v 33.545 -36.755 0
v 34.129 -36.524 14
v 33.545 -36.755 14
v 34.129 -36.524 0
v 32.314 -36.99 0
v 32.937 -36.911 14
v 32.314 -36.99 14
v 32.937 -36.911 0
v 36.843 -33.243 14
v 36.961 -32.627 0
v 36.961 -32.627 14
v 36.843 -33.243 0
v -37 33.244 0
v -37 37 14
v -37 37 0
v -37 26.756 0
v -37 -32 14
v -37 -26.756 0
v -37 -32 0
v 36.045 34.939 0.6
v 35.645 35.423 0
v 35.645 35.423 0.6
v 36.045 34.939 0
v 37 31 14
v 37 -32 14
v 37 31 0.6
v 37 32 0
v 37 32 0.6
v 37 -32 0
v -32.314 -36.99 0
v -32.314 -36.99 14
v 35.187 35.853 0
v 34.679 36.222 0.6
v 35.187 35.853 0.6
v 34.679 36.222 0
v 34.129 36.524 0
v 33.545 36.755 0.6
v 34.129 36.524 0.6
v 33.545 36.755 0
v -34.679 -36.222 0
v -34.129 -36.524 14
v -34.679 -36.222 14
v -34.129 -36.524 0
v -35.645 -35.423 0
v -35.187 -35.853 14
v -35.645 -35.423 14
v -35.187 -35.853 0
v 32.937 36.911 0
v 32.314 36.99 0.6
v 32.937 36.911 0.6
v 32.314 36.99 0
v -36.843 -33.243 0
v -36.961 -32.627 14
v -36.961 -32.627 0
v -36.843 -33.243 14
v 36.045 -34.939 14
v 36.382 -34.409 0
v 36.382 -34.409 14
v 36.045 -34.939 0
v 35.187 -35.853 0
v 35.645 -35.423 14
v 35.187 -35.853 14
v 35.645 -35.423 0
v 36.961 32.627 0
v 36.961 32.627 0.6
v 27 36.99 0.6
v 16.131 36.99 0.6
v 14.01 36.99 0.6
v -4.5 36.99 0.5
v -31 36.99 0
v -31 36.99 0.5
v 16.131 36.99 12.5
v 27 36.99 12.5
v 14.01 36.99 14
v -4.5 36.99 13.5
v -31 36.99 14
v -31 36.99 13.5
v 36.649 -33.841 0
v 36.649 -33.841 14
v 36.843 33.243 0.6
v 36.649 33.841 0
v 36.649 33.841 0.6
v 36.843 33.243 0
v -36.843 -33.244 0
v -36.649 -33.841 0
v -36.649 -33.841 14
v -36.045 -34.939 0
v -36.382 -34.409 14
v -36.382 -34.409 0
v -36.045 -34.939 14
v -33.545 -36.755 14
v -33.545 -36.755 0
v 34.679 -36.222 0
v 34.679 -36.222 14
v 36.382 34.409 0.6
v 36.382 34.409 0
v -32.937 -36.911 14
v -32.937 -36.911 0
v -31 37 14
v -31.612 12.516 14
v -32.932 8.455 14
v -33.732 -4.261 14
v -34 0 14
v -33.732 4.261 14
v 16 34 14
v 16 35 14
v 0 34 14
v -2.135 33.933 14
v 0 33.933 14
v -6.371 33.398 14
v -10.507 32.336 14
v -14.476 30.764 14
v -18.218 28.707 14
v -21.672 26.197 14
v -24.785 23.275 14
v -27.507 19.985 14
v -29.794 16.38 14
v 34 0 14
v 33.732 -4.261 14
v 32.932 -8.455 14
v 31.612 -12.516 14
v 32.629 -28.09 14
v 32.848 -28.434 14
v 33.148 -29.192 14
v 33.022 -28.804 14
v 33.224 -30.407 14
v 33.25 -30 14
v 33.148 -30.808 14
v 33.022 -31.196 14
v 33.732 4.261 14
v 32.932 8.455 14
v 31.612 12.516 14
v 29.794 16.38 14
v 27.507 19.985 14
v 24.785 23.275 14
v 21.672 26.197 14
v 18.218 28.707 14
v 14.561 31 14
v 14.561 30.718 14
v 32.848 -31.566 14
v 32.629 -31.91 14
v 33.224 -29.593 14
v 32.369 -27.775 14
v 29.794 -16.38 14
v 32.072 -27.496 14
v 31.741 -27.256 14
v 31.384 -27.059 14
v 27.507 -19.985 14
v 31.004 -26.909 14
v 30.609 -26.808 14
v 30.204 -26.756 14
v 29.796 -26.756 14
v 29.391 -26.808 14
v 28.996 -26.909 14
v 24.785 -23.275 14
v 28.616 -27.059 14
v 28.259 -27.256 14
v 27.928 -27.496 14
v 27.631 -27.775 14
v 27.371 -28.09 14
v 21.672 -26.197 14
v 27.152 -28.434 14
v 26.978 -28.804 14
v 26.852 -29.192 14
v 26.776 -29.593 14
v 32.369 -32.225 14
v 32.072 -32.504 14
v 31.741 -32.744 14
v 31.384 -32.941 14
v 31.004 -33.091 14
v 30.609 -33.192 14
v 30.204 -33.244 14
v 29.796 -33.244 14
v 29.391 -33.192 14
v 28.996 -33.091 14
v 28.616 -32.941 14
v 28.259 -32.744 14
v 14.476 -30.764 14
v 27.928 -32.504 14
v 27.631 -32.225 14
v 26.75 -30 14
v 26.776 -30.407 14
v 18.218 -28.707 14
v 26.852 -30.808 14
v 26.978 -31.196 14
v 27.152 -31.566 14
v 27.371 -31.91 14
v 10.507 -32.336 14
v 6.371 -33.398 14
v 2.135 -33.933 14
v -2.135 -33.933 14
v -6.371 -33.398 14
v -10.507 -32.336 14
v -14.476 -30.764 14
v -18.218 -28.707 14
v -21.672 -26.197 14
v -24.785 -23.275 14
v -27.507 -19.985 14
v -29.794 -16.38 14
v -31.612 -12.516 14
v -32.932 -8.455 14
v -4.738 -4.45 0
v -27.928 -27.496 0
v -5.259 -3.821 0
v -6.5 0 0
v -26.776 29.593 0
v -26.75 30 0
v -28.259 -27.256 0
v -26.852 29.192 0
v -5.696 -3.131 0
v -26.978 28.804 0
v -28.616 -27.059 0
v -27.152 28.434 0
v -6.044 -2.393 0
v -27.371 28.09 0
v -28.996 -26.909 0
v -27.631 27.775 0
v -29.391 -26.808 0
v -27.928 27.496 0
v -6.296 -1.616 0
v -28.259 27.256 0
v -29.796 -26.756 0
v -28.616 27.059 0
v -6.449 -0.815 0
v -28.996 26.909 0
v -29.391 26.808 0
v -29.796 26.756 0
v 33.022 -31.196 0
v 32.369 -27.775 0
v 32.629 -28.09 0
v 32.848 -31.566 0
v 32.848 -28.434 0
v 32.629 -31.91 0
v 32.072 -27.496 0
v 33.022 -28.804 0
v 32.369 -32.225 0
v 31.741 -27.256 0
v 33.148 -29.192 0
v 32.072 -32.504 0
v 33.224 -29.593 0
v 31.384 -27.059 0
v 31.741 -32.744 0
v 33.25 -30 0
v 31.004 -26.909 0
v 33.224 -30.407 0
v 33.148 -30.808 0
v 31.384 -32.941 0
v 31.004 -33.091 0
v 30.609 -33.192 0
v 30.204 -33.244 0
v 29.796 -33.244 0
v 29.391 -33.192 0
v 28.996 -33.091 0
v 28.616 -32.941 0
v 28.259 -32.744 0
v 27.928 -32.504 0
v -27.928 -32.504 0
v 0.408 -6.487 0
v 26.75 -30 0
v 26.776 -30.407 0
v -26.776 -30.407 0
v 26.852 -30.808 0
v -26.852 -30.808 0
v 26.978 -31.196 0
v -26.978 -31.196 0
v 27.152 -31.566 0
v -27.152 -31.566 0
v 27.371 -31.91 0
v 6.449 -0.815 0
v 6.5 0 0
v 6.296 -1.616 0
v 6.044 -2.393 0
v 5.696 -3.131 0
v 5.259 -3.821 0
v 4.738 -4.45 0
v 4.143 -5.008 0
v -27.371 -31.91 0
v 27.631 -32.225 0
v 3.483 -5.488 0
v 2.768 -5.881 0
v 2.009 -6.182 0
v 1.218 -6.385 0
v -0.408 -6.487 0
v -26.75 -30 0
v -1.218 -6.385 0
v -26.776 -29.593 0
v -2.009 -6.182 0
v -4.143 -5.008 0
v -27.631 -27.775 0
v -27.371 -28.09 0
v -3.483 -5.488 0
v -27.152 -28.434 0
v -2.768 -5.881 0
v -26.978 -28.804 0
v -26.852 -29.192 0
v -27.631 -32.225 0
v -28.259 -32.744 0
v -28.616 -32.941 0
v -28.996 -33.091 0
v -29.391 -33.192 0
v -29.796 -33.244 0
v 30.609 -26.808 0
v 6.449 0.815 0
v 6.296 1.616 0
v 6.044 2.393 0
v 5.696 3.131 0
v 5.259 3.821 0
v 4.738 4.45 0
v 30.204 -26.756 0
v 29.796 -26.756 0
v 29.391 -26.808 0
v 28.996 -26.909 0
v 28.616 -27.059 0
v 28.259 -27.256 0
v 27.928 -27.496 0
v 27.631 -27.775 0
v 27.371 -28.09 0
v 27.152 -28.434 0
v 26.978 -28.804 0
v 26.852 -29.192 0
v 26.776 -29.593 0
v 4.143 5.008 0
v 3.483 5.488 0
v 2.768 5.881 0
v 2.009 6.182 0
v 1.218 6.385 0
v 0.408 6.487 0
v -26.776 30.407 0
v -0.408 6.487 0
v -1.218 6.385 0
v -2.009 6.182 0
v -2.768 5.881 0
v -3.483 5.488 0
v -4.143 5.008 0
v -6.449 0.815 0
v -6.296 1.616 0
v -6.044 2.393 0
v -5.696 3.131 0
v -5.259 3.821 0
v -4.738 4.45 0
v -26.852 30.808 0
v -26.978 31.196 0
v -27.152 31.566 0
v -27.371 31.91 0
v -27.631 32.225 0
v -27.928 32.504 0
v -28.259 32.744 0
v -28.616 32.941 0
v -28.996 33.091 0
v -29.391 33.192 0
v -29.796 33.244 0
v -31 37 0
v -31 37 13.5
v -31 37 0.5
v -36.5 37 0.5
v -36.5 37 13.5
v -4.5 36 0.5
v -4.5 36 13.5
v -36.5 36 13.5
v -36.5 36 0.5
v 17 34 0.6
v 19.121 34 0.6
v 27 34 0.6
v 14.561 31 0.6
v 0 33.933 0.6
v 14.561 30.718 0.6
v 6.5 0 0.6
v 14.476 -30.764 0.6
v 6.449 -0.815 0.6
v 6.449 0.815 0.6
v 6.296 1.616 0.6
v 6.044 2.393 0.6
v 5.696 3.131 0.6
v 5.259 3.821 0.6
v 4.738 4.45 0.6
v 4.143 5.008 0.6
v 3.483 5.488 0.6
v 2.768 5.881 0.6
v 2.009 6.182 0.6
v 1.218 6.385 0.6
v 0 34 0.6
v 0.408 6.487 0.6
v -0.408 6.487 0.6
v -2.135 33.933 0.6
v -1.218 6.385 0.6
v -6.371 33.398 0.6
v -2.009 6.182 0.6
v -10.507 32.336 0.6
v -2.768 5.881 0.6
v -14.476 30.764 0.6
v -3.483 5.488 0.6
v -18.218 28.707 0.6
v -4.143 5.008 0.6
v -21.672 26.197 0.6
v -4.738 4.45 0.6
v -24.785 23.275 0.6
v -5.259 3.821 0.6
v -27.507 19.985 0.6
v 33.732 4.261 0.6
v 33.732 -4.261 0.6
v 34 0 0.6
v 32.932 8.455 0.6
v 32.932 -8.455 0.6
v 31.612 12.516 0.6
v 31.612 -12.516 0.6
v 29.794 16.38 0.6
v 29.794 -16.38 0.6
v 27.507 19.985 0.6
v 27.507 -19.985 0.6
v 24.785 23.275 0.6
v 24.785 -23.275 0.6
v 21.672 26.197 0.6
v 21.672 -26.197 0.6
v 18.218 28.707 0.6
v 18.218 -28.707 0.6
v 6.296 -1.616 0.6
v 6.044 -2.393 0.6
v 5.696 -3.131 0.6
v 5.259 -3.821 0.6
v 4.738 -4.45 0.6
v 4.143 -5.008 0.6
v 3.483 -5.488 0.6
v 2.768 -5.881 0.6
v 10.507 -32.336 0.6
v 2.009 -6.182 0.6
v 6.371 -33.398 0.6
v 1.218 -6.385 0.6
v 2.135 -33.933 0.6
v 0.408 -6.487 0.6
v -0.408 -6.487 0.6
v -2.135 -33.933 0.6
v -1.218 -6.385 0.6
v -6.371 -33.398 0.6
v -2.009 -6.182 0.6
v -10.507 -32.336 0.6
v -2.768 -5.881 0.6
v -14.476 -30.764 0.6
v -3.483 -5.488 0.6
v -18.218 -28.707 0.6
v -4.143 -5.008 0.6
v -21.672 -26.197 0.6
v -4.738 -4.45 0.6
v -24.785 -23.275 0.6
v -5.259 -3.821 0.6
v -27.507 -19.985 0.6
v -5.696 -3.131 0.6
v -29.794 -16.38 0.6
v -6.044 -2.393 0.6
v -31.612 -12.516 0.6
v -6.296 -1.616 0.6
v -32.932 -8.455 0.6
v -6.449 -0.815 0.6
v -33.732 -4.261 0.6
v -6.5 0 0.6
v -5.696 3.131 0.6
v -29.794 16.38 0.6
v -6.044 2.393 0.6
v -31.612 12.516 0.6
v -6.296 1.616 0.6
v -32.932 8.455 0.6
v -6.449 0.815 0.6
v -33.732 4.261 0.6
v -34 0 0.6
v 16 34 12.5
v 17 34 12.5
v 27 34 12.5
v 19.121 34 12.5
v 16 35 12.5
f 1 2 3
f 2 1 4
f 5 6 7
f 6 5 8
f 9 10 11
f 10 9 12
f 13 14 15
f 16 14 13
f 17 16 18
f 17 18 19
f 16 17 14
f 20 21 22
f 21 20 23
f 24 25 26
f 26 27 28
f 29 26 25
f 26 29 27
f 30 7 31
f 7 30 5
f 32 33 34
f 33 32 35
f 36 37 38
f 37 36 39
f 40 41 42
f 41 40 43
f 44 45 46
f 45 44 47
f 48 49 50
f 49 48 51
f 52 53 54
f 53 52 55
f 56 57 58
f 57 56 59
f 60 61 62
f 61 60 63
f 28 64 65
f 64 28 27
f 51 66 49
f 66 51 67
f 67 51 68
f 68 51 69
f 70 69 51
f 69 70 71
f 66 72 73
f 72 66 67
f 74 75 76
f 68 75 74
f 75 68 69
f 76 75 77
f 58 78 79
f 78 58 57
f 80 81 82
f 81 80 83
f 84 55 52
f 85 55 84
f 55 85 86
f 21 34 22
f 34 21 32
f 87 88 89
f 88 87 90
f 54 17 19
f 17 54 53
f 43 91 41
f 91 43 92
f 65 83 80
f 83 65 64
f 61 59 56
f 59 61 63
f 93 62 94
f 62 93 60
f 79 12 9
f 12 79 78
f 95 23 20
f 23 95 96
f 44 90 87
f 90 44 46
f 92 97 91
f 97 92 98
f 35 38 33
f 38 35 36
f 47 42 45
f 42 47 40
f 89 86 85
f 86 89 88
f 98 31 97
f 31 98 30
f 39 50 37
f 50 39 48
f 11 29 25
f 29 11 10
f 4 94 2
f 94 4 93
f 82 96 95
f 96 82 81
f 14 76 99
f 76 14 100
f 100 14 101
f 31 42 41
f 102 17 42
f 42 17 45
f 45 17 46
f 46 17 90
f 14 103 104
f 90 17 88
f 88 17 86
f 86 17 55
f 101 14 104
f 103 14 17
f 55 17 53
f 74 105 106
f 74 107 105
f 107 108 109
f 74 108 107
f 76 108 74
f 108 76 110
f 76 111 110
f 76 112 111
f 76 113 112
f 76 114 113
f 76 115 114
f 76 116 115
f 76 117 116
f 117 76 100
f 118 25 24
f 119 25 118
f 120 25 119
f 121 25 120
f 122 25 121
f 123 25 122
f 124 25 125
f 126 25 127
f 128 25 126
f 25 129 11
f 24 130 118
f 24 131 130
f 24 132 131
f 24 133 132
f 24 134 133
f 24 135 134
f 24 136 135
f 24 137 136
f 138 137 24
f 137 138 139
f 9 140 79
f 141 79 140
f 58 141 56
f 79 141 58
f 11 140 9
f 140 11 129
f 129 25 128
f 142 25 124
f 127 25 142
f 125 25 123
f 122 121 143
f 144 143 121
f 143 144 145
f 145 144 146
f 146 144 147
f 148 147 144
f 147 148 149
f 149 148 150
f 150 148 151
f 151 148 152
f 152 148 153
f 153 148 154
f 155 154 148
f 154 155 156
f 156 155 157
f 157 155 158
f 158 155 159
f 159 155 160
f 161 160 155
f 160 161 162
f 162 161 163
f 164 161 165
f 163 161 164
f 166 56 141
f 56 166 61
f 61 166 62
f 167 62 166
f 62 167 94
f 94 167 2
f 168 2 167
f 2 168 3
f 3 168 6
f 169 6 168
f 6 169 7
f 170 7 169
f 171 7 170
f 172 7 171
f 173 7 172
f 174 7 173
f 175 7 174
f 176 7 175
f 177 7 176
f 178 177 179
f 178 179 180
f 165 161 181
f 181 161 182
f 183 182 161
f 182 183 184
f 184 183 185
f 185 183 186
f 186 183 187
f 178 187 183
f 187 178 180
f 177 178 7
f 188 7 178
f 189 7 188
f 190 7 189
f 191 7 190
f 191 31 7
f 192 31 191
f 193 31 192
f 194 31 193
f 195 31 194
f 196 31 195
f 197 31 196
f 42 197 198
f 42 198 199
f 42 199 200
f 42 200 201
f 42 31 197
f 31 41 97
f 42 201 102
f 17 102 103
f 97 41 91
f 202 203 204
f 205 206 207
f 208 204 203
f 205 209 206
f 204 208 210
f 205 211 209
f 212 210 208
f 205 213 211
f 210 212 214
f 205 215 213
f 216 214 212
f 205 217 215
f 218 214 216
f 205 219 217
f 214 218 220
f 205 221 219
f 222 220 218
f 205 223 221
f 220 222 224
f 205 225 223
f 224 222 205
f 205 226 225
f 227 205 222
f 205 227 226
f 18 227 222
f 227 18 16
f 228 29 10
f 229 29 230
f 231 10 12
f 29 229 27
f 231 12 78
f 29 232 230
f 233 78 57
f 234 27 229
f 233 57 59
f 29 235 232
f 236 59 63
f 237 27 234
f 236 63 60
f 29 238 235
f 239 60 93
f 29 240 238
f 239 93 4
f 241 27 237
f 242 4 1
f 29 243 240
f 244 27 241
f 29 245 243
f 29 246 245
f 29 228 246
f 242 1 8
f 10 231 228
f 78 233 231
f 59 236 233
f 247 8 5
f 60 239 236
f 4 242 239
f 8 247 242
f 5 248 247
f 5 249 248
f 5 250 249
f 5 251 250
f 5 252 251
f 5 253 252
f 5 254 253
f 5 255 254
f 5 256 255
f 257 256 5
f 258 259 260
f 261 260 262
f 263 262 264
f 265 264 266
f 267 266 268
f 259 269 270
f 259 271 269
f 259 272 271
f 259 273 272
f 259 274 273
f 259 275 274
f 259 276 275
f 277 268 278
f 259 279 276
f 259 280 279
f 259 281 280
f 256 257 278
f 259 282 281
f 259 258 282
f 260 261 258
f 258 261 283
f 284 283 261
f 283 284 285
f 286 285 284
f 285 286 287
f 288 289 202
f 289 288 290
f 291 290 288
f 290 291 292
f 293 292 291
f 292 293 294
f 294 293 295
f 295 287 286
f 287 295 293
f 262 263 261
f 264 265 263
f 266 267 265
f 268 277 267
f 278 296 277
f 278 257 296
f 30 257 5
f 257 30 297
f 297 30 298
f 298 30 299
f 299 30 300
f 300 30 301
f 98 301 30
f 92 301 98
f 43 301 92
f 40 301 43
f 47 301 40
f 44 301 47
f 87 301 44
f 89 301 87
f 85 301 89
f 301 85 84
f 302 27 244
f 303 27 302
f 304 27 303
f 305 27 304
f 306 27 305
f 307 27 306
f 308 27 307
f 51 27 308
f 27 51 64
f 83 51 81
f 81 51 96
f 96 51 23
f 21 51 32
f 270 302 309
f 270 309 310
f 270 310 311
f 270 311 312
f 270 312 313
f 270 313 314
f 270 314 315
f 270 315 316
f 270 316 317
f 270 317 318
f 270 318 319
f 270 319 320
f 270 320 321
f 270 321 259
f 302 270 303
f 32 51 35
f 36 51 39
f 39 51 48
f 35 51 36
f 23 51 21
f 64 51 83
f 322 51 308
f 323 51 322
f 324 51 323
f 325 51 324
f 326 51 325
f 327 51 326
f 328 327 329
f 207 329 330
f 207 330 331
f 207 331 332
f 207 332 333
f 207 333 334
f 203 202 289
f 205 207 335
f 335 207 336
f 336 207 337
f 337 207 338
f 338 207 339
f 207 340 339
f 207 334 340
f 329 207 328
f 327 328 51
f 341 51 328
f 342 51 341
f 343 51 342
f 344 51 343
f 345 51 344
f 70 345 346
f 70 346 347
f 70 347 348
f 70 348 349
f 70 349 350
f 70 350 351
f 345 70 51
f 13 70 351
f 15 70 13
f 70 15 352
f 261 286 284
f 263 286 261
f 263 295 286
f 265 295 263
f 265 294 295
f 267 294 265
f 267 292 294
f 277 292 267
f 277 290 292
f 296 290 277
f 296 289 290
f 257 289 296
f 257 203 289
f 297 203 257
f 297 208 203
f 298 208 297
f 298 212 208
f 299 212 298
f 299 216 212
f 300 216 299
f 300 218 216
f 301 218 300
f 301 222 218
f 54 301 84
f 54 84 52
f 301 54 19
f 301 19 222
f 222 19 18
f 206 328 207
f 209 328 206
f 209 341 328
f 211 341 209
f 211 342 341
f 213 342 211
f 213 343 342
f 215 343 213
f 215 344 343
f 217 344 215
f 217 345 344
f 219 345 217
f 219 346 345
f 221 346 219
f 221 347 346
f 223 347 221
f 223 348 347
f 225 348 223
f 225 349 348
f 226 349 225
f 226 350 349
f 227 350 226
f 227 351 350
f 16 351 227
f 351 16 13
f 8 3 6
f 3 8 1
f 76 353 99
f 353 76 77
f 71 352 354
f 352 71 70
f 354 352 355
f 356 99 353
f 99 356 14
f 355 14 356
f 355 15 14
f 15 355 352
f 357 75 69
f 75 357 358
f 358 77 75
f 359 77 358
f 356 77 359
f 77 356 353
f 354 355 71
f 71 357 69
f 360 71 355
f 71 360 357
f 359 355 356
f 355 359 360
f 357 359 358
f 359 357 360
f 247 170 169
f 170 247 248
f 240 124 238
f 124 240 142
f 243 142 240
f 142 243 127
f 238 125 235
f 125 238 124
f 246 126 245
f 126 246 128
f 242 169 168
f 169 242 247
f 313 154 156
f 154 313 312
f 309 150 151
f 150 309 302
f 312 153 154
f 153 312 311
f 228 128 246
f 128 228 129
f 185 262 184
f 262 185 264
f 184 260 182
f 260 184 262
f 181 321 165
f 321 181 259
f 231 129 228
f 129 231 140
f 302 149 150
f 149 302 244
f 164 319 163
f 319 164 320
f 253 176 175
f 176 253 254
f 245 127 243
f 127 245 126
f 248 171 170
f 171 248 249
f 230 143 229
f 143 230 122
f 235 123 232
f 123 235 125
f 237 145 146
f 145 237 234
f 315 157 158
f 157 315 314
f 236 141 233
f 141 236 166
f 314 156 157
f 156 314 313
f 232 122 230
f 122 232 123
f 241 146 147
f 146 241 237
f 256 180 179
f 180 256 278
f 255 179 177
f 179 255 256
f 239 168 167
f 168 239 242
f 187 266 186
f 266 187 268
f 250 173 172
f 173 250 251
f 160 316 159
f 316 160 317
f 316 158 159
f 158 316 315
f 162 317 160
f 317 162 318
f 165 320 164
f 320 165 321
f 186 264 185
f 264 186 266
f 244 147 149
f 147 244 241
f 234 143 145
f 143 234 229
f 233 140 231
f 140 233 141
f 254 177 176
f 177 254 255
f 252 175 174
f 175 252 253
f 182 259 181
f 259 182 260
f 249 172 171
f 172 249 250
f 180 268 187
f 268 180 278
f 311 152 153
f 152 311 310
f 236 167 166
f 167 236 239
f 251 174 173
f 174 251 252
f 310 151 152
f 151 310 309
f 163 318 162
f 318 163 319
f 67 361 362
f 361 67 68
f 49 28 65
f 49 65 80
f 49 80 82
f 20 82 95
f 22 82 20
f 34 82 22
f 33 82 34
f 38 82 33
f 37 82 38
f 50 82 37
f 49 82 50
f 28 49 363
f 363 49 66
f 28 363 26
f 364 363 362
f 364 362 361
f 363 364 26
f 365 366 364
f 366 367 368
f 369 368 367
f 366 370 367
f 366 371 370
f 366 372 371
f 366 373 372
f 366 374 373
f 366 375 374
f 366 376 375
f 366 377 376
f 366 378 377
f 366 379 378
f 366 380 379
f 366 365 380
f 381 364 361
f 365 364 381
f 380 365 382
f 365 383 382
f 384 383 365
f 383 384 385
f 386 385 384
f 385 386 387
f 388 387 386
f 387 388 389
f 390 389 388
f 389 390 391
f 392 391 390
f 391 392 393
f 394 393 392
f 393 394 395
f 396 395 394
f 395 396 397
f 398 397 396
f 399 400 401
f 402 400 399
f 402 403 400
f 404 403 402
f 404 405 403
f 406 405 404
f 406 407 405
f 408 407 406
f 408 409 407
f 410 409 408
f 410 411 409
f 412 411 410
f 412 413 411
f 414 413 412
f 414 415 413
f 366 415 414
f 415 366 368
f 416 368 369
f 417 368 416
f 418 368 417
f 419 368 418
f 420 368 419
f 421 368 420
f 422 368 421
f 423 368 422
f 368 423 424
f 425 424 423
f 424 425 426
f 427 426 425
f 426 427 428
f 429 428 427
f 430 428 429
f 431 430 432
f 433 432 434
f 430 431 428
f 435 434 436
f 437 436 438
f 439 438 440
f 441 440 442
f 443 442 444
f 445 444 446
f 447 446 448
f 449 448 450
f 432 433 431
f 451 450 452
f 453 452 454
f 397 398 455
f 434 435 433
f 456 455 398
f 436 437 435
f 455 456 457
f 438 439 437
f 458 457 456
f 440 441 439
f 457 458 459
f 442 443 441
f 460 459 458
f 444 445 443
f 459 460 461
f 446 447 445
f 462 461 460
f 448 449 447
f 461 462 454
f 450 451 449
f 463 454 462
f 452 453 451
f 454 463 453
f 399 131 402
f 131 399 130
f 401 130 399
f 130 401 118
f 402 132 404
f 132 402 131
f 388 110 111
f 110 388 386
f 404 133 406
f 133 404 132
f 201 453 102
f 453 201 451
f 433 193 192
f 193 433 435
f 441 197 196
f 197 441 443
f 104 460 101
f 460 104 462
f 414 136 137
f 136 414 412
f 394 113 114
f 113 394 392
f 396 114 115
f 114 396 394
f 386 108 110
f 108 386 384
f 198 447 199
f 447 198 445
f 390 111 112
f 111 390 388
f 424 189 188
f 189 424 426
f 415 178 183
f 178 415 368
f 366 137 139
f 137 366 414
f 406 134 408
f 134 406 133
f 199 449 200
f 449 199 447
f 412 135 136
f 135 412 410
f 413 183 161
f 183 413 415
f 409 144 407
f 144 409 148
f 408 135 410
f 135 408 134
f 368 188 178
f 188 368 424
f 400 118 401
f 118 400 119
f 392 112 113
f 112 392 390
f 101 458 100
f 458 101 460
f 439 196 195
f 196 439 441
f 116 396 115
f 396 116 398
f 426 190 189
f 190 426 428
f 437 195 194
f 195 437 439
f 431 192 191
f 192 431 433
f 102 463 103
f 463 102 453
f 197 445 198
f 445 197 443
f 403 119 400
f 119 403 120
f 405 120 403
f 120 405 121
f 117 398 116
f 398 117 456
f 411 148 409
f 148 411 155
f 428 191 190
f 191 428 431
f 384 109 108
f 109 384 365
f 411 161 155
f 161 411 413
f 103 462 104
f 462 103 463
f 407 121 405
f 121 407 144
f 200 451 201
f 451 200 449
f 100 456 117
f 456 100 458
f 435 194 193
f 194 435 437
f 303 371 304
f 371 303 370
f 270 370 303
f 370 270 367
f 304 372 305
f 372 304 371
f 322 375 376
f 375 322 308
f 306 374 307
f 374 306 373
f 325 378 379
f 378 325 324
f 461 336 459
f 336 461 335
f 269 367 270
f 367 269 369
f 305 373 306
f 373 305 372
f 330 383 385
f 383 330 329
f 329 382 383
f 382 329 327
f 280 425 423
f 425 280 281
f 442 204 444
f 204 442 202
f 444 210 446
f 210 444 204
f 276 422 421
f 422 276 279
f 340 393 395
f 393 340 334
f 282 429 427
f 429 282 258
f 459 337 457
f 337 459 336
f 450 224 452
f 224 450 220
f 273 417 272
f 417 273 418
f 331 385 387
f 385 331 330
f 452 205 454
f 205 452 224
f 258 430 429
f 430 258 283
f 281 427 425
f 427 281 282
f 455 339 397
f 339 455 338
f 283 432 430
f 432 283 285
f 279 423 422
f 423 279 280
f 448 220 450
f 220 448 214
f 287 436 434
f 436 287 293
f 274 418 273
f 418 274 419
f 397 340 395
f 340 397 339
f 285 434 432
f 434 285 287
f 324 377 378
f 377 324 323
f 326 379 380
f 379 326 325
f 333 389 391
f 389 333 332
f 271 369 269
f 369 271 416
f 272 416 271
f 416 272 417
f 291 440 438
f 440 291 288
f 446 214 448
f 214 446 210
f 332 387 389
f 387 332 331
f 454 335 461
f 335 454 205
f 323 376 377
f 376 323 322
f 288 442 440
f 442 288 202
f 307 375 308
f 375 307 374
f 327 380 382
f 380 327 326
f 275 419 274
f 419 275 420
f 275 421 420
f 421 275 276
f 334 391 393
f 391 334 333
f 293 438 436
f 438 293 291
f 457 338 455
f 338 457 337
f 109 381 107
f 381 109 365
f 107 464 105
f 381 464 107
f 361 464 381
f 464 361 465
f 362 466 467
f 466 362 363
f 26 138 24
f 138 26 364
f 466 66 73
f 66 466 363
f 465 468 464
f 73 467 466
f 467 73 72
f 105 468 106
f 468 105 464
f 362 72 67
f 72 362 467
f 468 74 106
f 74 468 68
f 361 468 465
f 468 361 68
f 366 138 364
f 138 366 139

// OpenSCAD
$fn = 50;


difference() {
	union() {
		hull() {
			translate(v = [-32.0000000000, 32.0000000000, 0]) {
				cylinder(h = 14, r = 5);
			}
			translate(v = [32.0000000000, 32.0000000000, 0]) {
				cylinder(h = 14, r = 5);
			}
			translate(v = [-32.0000000000, -32.0000000000, 0]) {
				cylinder(h = 14, r = 5);
			}
			translate(v = [32.0000000000, -32.0000000000, 0]) {
				cylinder(h = 14, r = 5);
			}
		}
		translate(v = [-37.0000000000, 31.0000000000, 0]) {
			cube(size = [6, 6, 14]);
		}
	}
	union() {
		translate(v = [-37.5000000000, -30.0000000000, -250.0000000000]) {
			rotate(a = [0, 0, 0]) {
				difference() {
					union() {
						hull() {
							translate(v = [7.5000000000, 0, 0]) {
								cylinder(h = 250, r = 3.2500000000, r1 = 3.2500000000, r2 = 3.2500000000);
							}
							translate(v = [-7.5000000000, 0, 0]) {
								cylinder(h = 250, r = 3.2500000000, r1 = 3.2500000000, r2 = 3.2500000000);
							}
						}
					}
					union();
				}
			}
		}
		translate(v = [-37.5000000000, 30.0000000000, -250.0000000000]) {
			rotate(a = [0, 0, 0]) {
				difference() {
					union() {
						hull() {
							translate(v = [7.5000000000, 0, 0]) {
								cylinder(h = 250, r = 3.2500000000, r1 = 3.2500000000, r2 = 3.2500000000);
							}
							translate(v = [-7.5000000000, 0, 0]) {
								cylinder(h = 250, r = 3.2500000000, r1 = 3.2500000000, r2 = 3.2500000000);
							}
						}
					}
					union();
				}
			}
		}
		translate(v = [-36.5000000000, 36.0000000000, 0.5000000000]) {
			cube(size = [32, 1, 13.0000000000]);
		}
		translate(v = [30.0000000000, -30.0000000000, -50.0000000000]) {
			cylinder(h = 100, r = 3.2500000000);
		}
		translate(v = [0, 0, 0.6000000000]) {
			cylinder(h = 16.4000000000, r = 34.0000000000);
		}
		translate(v = [0, 0, -7.0000000000]) {
			cylinder(h = 14, r = 6.5000000000);
		}
		translate(v = [0.0000000000, 31.0000000000, 0.6000000000]) {
			cube(size = [37.0000000000, 3, 16.4000000000]);
		}
		translate(v = [27.0000000000, 31.0000000000, 0.6000000000]) {
			cube(size = [10, 6, 16.4000000000]);
		}
		translate(v = [16.0000000000, 31.0000000000, 12.5000000000]) {
			cube(size = [21, 6, 1.5000000000]);
		}
		translate(v = [13.2500000000, 37.7500000000, 0.6000000000]) {
			rotate(a = [0, 0, -45]) {
				cube(size = [7.5000000000, 1.5000000000, 16.4000000000]);
			}
		}
		translate(v = [7.0610000000, 29.0000000000, 0.6000000000]) {
			cube(size = [7.5000000000, 2, 13.4000000000]);
		}
	}
}
